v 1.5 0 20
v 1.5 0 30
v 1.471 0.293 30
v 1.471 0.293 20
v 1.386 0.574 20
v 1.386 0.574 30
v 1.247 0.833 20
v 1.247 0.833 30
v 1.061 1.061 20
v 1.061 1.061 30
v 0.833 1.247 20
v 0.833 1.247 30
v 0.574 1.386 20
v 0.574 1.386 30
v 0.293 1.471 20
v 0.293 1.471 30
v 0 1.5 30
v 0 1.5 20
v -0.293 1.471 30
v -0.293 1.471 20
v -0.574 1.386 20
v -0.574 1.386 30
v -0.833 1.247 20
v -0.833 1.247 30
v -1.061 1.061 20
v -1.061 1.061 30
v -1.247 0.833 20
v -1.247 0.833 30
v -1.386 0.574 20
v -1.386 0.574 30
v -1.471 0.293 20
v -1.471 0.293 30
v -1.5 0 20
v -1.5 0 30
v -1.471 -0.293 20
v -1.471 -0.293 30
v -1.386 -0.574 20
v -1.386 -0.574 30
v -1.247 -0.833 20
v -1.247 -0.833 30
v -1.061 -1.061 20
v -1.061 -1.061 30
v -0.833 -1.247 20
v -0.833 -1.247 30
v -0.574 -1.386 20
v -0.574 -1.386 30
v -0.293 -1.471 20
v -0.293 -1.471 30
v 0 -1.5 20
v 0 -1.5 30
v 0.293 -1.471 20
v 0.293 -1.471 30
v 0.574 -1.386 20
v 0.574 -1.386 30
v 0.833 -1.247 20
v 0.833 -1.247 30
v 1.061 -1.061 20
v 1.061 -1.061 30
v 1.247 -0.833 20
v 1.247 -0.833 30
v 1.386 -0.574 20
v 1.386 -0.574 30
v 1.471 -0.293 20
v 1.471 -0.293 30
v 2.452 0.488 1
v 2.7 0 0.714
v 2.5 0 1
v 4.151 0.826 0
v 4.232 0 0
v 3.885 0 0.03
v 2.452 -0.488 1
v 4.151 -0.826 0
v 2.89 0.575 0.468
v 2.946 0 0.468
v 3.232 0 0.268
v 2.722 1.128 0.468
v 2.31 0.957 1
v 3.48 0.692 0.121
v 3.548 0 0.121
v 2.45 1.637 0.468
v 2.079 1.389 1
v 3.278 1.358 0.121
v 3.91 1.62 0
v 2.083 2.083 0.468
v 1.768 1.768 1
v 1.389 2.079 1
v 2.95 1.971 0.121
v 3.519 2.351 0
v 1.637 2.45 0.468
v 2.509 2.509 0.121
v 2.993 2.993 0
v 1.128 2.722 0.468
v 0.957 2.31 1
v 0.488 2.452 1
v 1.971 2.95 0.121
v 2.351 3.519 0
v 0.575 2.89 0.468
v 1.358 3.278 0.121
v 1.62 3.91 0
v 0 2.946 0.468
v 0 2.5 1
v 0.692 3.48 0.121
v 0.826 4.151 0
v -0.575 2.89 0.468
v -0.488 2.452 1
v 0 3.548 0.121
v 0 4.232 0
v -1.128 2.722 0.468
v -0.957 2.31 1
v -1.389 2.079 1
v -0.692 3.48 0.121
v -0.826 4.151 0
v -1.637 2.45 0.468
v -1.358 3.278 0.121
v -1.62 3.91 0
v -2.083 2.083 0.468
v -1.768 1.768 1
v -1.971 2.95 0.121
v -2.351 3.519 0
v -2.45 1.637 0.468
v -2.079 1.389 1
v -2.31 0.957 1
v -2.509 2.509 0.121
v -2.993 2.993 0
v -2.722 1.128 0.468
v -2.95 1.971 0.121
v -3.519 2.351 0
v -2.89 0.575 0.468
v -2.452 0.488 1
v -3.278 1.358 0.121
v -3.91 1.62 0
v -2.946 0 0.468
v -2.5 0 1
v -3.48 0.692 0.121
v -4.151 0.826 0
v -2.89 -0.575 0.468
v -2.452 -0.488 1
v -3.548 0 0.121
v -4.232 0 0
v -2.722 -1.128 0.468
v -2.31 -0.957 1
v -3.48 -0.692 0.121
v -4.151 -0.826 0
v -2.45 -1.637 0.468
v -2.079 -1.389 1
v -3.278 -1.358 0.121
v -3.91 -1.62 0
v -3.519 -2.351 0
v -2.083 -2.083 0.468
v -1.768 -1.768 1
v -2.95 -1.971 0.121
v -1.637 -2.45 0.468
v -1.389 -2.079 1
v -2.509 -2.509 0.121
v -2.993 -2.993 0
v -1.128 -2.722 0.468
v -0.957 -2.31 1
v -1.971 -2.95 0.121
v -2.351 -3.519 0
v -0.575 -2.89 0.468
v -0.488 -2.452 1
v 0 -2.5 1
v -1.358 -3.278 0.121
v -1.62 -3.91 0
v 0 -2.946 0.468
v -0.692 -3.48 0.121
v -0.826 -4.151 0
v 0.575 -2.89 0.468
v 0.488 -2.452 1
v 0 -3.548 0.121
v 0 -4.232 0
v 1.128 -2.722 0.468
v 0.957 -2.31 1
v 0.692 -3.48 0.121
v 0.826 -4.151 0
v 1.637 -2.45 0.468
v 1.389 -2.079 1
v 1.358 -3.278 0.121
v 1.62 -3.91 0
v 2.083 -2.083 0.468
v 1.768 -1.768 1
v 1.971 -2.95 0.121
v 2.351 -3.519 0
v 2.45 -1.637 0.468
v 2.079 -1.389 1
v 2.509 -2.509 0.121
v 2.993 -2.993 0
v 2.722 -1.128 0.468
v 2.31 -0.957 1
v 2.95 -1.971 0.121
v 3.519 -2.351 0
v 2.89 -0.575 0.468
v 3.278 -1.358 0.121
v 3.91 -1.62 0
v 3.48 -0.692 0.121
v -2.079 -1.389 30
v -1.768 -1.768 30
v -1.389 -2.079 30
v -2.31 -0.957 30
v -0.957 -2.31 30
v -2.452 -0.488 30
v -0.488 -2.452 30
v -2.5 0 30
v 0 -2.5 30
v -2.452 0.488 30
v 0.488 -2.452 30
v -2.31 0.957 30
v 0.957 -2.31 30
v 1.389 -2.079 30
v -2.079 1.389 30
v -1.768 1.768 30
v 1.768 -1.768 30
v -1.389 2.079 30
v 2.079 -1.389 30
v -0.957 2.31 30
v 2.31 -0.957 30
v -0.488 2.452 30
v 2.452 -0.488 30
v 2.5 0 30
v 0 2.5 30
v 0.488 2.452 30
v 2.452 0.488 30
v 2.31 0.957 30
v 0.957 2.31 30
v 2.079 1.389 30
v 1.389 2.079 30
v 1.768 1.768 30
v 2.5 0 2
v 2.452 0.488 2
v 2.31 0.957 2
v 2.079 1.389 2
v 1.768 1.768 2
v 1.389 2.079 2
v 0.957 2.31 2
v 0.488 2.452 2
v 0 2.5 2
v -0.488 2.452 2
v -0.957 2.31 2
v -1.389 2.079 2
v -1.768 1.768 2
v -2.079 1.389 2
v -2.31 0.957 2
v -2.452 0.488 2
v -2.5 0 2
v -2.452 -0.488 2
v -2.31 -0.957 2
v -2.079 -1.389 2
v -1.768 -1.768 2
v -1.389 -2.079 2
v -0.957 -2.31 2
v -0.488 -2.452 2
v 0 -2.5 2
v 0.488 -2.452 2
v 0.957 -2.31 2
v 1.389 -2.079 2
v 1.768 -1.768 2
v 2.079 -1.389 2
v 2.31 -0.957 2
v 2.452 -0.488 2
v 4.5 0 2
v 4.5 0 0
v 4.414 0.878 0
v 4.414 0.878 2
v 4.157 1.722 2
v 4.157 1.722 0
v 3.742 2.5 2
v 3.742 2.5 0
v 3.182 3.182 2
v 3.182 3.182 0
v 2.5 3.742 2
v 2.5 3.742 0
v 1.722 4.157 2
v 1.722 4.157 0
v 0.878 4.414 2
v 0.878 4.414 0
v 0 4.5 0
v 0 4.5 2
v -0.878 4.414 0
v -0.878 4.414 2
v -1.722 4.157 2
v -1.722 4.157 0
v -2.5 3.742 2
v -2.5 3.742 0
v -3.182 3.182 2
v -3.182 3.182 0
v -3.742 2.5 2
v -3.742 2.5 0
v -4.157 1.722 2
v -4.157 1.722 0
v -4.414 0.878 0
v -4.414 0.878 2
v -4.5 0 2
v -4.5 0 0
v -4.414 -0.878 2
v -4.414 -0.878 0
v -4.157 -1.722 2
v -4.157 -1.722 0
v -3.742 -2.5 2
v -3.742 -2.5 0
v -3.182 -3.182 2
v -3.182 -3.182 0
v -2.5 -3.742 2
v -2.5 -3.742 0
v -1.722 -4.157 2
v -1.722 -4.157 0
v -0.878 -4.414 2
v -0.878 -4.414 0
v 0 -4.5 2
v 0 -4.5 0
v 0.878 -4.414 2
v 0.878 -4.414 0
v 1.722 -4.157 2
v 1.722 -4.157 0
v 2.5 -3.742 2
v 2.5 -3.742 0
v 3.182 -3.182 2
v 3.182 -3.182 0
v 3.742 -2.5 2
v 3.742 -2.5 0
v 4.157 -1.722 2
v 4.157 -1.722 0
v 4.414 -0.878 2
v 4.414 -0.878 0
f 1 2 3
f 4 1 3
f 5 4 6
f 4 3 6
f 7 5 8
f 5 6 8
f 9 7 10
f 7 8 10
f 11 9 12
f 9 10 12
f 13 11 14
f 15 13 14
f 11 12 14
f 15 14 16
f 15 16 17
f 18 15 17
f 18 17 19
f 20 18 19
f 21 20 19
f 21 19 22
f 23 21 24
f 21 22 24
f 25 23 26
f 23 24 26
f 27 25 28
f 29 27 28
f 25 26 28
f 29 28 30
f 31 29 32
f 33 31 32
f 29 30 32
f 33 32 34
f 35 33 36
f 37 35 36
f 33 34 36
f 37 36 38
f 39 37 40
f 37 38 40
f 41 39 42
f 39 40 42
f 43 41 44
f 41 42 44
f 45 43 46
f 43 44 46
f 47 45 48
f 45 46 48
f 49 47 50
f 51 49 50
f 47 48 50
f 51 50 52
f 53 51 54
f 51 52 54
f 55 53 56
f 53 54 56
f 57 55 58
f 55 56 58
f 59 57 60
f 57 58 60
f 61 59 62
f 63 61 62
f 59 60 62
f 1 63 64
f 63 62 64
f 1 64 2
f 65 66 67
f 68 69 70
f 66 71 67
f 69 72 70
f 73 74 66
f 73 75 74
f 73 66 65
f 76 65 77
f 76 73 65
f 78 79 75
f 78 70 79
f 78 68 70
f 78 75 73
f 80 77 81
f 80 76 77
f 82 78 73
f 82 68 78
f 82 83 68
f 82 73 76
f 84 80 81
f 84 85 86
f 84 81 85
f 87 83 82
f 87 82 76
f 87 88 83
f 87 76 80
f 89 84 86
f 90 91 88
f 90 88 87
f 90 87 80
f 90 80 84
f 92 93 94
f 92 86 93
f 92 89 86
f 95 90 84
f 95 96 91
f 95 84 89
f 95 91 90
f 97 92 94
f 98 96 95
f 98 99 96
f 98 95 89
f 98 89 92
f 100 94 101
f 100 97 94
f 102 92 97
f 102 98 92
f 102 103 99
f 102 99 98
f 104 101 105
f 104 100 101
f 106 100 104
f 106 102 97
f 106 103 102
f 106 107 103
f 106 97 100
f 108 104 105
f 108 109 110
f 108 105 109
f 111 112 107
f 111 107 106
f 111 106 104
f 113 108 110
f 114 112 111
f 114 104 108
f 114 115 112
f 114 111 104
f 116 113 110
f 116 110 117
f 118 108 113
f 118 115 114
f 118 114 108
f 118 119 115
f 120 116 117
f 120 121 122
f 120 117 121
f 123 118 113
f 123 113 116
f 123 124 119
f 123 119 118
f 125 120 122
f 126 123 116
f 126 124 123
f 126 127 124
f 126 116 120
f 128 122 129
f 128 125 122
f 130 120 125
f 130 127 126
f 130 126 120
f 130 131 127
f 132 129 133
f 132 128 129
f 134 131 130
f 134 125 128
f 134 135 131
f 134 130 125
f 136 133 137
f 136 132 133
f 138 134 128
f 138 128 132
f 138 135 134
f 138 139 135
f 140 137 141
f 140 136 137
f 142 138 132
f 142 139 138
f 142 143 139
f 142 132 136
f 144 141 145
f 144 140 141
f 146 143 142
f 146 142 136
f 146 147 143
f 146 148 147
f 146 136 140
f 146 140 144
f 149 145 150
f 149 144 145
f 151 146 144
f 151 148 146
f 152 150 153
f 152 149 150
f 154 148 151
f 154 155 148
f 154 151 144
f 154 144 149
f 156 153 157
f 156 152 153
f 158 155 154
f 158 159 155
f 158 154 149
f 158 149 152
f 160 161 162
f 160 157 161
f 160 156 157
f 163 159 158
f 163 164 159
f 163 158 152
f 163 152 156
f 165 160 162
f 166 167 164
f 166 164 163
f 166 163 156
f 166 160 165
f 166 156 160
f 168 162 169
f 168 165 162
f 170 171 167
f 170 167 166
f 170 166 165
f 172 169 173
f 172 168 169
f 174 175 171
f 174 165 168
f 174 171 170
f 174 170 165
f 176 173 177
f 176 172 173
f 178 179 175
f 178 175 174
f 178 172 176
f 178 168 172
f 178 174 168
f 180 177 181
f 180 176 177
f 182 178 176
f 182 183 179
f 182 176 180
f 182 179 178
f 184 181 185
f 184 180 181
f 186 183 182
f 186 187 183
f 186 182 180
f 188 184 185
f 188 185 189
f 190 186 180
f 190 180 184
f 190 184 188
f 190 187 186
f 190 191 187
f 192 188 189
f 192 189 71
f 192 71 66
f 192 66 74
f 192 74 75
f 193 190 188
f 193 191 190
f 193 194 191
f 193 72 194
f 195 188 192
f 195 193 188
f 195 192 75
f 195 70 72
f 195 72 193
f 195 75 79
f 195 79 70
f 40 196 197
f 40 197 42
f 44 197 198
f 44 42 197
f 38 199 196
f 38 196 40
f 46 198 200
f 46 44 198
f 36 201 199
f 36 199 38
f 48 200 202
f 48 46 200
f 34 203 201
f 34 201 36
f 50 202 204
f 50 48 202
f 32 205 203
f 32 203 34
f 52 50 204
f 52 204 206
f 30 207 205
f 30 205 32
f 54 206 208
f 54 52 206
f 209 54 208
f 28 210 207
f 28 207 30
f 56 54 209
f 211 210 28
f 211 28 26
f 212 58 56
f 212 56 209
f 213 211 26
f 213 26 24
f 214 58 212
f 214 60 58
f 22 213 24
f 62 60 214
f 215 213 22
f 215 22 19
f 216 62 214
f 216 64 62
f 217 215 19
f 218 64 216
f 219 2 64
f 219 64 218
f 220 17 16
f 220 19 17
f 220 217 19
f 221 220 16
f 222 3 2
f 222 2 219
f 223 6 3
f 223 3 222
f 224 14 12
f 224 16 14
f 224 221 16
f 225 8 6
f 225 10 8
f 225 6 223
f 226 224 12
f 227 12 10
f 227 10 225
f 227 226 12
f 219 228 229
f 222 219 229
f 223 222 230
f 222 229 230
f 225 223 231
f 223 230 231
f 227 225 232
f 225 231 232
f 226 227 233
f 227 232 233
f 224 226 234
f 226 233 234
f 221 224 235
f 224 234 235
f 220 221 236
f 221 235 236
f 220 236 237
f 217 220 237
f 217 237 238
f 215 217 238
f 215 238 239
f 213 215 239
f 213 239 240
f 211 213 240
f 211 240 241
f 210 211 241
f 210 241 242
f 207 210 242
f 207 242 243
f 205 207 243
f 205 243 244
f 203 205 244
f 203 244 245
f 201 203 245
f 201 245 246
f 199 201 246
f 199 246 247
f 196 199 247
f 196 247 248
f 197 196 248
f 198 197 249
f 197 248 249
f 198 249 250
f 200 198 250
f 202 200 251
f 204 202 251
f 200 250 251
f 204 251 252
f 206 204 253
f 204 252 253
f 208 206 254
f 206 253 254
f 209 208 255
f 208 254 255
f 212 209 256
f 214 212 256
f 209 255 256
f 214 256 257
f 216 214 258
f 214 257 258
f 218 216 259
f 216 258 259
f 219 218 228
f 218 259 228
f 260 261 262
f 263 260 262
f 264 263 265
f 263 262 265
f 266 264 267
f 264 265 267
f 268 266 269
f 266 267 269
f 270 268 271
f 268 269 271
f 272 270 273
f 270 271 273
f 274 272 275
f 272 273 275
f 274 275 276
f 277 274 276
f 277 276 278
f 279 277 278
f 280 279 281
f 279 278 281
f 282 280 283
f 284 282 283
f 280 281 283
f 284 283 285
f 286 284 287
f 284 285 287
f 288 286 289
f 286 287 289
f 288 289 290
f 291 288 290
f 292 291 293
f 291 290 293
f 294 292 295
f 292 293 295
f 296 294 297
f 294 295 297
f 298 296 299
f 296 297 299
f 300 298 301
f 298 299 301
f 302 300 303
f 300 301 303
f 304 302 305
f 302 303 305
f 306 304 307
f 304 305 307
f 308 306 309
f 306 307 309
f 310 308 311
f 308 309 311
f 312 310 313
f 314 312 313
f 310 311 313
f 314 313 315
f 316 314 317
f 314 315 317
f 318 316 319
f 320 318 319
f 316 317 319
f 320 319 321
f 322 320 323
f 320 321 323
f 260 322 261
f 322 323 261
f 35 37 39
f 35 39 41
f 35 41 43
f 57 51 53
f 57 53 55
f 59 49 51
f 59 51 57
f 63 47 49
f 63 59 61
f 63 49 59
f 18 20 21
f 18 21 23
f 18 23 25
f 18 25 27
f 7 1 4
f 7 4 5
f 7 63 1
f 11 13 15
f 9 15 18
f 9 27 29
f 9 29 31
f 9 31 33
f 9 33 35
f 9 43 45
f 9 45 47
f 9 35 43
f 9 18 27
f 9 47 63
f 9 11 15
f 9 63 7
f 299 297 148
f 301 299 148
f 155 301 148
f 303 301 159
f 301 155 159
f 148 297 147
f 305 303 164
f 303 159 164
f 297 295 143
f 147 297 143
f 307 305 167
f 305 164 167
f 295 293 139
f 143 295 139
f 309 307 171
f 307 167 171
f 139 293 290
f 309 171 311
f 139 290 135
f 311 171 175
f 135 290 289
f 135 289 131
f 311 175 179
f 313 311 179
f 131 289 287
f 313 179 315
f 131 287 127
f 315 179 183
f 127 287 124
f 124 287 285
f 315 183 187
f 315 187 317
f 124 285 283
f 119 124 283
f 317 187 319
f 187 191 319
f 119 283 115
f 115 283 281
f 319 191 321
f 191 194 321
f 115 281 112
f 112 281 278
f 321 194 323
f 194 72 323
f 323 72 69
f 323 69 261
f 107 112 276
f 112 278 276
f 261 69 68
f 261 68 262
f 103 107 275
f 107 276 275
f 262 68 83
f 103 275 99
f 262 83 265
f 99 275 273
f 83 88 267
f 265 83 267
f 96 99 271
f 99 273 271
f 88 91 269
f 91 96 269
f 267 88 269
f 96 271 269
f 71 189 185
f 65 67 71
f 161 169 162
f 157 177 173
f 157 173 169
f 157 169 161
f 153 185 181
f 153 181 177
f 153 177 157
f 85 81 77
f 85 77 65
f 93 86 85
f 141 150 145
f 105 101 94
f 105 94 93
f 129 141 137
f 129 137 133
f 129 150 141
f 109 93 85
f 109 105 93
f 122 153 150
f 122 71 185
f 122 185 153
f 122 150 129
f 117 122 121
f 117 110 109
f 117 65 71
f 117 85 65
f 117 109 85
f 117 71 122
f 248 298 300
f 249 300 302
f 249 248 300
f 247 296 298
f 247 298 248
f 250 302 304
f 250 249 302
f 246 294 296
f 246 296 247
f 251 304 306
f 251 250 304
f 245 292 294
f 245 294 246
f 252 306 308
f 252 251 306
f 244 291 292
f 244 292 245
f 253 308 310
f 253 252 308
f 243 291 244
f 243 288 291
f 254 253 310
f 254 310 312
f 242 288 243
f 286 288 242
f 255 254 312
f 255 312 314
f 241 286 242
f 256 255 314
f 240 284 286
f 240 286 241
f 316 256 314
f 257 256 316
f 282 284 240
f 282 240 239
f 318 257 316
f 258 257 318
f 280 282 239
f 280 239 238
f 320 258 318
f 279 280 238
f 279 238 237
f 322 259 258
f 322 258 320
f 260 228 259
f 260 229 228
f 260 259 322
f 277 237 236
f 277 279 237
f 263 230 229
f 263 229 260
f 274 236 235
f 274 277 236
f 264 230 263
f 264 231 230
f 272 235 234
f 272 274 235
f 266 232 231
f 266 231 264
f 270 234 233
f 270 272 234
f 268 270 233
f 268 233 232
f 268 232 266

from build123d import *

# Parameters (mm, degrees)
SKETCH1_R           = 4.5
SKETCH1_R_2         = 2.5
BOSS_EXTRUDE1_DEPTH = 2
SKETCH5_R           = 2.5
BOSS_EXTRUDE3_DEPTH = 28
SKETCH6_R           = 1.5
CUT_EXTRUDE3_DEPTH  = 10
BOSS_EXTRUDE4_START = 1
SKETCH7_R           = 2.5
BOSS_EXTRUDE4_DEPTH = 1
FILLET1_R           = 2


with BuildPart() as part:
    # Sketch1 → Boss-Extrude1 (new body)
    with BuildSketch(Plane.XY):
        Circle(SKETCH1_R)
        Circle(SKETCH1_R_2, mode=Mode.SUBTRACT)
    extrude(amount=BOSS_EXTRUDE1_DEPTH)



with BuildPart() as body_2:
    # Sketch5 → Boss-Extrude3 (new body)
    with BuildSketch(Plane.XY.offset(2)):
        Circle(SKETCH5_R)
    extrude(amount=BOSS_EXTRUDE3_DEPTH)

    # Sketch6 → Cut-Extrude3 (cut)
    with BuildSketch(Plane.XY.offset(30)):
        Circle(SKETCH6_R)
    extrude(amount=-CUT_EXTRUDE3_DEPTH, mode=Mode.SUBTRACT)


with BuildPart() as part_1:
    add(part.part)

    add(body_2.part)  # Boss-Extrude4 merges body 2
    # Sketch7 → Boss-Extrude4 (add)
    with BuildSketch(Plane(origin=(0, 0, 2), x_dir=(-1, 0, 0), z_dir=(0, 0, -1)).offset(BOSS_EXTRUDE4_START)):
        Circle(SKETCH7_R)
    extrude(amount=-BOSS_EXTRUDE4_DEPTH)

    # Fillet1
    # the kernel refuses this fillet: 2 mm, written as the material it takes off along each edge
    with BuildSketch(Plane(origin=(0, 0, 0), x_dir=(1, 0, 0), z_dir=(0, -1, 0))) as fillet1_piece_1:
        with BuildLine():
            CenterArc((4.232050808, 2), FILLET1_R, 210, 60)
            Line((2.5, 1), (2.465358984, 0.98))
            ThreePointArc((2.465358984, 0.98), (2.46, 0.5), (2.46, 0))
            Line((2.46, 0), (2.5, -0.04))
            Line((2.5, -0.04), (4.232050808, -0.04))
            Line((4.232050808, -0.04), (4.232050808, 0))
        make_face()
    revolve(axis=Axis((0, 0, 0), (0, 0, 1)), mode=Mode.SUBTRACT)


solid = part_1.part
